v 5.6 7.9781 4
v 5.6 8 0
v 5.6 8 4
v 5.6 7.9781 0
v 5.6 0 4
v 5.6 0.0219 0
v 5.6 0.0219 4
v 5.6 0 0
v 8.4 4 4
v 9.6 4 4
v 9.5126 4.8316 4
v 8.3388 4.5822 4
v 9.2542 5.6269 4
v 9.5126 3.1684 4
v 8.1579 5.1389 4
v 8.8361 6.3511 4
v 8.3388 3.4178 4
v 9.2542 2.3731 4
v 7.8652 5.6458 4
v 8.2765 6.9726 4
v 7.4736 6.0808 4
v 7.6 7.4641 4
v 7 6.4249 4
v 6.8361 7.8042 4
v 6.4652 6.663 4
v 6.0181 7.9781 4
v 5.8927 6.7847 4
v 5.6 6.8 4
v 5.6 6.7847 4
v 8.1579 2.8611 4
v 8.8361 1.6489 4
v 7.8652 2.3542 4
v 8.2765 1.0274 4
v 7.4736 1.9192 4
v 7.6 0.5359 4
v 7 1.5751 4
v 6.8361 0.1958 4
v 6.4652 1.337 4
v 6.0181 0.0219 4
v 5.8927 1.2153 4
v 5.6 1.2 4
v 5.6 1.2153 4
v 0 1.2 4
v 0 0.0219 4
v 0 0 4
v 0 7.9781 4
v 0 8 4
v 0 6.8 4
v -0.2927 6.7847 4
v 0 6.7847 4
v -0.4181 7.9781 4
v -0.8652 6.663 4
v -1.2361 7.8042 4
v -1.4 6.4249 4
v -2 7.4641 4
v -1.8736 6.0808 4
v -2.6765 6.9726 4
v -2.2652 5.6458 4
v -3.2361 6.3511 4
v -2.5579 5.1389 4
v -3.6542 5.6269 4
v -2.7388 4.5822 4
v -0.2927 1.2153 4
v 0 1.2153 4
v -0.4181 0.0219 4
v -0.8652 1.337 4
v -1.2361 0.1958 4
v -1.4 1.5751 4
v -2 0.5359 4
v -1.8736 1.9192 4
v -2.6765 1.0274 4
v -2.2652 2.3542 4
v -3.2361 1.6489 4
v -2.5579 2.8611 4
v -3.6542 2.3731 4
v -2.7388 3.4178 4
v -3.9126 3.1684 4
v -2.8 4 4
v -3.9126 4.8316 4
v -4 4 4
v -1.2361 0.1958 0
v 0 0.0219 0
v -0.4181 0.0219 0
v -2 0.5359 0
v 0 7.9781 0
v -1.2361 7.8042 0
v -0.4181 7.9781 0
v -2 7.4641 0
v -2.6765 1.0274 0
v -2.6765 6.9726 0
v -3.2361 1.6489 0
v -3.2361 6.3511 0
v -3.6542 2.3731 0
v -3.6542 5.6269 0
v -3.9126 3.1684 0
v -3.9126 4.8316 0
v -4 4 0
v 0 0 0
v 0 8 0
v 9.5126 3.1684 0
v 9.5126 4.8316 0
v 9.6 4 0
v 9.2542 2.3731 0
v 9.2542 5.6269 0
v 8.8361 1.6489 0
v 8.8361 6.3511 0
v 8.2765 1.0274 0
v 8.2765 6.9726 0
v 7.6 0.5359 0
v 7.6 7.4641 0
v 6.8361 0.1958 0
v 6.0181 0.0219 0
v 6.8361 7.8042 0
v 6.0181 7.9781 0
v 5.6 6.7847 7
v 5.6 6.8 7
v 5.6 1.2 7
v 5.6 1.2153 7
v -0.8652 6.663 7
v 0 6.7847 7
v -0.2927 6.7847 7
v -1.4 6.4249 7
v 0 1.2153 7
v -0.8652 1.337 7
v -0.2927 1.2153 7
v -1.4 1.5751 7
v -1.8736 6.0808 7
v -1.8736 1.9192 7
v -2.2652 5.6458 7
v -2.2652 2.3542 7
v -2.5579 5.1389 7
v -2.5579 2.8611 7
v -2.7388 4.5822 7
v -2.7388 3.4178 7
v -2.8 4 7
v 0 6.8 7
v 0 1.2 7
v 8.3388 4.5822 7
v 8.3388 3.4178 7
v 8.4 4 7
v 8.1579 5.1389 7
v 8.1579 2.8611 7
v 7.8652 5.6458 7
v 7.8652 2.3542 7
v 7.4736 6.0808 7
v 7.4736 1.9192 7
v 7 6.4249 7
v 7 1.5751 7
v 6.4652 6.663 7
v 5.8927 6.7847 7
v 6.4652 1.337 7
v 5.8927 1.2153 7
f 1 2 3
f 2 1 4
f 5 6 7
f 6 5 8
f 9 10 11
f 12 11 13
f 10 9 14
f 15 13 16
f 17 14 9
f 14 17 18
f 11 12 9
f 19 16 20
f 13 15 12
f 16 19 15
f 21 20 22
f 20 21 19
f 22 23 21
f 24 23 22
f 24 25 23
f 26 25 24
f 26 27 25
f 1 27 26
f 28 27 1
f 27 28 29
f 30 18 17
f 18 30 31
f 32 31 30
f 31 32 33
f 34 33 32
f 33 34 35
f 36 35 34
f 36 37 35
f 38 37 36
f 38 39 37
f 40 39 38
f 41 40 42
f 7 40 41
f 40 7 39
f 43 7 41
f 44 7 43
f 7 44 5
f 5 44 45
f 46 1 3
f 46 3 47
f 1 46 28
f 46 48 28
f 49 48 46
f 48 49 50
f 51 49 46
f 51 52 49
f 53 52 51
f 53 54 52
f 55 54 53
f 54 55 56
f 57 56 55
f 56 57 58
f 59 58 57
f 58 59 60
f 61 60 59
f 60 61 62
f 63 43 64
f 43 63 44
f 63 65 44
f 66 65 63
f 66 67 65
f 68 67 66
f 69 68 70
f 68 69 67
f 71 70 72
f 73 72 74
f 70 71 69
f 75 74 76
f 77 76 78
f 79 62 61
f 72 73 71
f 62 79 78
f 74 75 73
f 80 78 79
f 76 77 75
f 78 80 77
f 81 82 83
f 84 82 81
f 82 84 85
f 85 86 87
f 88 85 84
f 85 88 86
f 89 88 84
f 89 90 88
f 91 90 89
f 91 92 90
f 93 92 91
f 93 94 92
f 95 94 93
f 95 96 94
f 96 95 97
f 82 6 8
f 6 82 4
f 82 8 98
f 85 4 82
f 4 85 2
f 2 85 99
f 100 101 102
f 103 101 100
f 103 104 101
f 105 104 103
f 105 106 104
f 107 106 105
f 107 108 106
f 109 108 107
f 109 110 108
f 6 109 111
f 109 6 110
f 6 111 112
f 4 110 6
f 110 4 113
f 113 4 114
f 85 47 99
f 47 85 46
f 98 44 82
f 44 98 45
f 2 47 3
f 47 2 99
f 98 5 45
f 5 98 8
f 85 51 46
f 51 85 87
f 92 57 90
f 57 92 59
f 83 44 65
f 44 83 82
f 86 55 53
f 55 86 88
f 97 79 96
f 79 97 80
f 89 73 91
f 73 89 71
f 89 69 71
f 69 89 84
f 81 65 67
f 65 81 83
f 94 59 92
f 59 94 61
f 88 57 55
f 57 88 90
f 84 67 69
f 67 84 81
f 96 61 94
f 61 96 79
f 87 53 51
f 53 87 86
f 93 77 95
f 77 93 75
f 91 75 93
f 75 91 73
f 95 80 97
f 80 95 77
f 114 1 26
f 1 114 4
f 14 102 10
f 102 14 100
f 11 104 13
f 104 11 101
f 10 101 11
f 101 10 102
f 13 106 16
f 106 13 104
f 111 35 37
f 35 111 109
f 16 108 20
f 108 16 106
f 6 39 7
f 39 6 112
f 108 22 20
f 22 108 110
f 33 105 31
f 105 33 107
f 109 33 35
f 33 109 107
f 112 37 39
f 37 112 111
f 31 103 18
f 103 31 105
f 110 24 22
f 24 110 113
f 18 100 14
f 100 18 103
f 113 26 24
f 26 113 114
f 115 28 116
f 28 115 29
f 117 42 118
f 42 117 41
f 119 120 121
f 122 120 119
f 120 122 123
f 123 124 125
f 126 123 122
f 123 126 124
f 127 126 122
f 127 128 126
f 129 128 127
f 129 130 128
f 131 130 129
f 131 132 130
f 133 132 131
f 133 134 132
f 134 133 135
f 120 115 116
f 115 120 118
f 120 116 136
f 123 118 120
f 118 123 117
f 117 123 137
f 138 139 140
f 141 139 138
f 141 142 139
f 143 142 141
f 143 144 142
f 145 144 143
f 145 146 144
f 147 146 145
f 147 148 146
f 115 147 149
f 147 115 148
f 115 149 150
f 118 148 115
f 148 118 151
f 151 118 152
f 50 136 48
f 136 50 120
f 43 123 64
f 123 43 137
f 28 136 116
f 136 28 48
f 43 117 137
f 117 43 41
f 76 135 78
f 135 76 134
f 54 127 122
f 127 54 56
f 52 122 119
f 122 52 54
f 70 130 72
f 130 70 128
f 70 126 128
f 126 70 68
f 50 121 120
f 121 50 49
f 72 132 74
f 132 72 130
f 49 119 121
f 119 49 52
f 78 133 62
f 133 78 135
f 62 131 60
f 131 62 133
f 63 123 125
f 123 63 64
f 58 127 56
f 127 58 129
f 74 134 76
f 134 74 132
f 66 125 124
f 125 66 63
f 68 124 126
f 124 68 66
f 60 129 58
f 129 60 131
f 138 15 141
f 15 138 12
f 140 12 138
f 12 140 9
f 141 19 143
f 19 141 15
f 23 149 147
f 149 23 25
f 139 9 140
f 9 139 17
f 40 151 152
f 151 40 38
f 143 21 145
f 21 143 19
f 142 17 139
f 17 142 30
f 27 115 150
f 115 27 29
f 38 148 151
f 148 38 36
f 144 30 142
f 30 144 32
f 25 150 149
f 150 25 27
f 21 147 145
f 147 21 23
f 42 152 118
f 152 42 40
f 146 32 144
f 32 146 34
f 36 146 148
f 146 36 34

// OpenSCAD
// Making a button for the RepRap lcd Smart Controller
/* Main Params */
base_length = 13.6;
base_width = 8;
base_height = 4;
total_height = 7;
reduced_width = 5.6;

/* Computed params */
reduced_length = base_length-(base_width-reduced_width);
// Y Translation for reduced part
red_y_trans = 0.5*(base_width-reduced_width);
red_x_trans = 0; // 2*(base_length-reduced_length);

// Make this thing happen
union() {
	// Base shape
	button_shape(base_length, base_width, base_height);
	// Reduced part
	translate([red_x_trans, red_y_trans,0]) button_shape(reduced_length, reduced_width,total_height);
}


module button_shape(l,w,h) {
	l_cub = l-w;
	cube([l_cub, w, h]);
	translate([0,0.5*w,0]) cylinder(h=h, r=0.5*w, $fn=30);
	translate([l_cub,0.5*w,0]) cylinder(h=h, r=0.5*w, $fn=30);
}
